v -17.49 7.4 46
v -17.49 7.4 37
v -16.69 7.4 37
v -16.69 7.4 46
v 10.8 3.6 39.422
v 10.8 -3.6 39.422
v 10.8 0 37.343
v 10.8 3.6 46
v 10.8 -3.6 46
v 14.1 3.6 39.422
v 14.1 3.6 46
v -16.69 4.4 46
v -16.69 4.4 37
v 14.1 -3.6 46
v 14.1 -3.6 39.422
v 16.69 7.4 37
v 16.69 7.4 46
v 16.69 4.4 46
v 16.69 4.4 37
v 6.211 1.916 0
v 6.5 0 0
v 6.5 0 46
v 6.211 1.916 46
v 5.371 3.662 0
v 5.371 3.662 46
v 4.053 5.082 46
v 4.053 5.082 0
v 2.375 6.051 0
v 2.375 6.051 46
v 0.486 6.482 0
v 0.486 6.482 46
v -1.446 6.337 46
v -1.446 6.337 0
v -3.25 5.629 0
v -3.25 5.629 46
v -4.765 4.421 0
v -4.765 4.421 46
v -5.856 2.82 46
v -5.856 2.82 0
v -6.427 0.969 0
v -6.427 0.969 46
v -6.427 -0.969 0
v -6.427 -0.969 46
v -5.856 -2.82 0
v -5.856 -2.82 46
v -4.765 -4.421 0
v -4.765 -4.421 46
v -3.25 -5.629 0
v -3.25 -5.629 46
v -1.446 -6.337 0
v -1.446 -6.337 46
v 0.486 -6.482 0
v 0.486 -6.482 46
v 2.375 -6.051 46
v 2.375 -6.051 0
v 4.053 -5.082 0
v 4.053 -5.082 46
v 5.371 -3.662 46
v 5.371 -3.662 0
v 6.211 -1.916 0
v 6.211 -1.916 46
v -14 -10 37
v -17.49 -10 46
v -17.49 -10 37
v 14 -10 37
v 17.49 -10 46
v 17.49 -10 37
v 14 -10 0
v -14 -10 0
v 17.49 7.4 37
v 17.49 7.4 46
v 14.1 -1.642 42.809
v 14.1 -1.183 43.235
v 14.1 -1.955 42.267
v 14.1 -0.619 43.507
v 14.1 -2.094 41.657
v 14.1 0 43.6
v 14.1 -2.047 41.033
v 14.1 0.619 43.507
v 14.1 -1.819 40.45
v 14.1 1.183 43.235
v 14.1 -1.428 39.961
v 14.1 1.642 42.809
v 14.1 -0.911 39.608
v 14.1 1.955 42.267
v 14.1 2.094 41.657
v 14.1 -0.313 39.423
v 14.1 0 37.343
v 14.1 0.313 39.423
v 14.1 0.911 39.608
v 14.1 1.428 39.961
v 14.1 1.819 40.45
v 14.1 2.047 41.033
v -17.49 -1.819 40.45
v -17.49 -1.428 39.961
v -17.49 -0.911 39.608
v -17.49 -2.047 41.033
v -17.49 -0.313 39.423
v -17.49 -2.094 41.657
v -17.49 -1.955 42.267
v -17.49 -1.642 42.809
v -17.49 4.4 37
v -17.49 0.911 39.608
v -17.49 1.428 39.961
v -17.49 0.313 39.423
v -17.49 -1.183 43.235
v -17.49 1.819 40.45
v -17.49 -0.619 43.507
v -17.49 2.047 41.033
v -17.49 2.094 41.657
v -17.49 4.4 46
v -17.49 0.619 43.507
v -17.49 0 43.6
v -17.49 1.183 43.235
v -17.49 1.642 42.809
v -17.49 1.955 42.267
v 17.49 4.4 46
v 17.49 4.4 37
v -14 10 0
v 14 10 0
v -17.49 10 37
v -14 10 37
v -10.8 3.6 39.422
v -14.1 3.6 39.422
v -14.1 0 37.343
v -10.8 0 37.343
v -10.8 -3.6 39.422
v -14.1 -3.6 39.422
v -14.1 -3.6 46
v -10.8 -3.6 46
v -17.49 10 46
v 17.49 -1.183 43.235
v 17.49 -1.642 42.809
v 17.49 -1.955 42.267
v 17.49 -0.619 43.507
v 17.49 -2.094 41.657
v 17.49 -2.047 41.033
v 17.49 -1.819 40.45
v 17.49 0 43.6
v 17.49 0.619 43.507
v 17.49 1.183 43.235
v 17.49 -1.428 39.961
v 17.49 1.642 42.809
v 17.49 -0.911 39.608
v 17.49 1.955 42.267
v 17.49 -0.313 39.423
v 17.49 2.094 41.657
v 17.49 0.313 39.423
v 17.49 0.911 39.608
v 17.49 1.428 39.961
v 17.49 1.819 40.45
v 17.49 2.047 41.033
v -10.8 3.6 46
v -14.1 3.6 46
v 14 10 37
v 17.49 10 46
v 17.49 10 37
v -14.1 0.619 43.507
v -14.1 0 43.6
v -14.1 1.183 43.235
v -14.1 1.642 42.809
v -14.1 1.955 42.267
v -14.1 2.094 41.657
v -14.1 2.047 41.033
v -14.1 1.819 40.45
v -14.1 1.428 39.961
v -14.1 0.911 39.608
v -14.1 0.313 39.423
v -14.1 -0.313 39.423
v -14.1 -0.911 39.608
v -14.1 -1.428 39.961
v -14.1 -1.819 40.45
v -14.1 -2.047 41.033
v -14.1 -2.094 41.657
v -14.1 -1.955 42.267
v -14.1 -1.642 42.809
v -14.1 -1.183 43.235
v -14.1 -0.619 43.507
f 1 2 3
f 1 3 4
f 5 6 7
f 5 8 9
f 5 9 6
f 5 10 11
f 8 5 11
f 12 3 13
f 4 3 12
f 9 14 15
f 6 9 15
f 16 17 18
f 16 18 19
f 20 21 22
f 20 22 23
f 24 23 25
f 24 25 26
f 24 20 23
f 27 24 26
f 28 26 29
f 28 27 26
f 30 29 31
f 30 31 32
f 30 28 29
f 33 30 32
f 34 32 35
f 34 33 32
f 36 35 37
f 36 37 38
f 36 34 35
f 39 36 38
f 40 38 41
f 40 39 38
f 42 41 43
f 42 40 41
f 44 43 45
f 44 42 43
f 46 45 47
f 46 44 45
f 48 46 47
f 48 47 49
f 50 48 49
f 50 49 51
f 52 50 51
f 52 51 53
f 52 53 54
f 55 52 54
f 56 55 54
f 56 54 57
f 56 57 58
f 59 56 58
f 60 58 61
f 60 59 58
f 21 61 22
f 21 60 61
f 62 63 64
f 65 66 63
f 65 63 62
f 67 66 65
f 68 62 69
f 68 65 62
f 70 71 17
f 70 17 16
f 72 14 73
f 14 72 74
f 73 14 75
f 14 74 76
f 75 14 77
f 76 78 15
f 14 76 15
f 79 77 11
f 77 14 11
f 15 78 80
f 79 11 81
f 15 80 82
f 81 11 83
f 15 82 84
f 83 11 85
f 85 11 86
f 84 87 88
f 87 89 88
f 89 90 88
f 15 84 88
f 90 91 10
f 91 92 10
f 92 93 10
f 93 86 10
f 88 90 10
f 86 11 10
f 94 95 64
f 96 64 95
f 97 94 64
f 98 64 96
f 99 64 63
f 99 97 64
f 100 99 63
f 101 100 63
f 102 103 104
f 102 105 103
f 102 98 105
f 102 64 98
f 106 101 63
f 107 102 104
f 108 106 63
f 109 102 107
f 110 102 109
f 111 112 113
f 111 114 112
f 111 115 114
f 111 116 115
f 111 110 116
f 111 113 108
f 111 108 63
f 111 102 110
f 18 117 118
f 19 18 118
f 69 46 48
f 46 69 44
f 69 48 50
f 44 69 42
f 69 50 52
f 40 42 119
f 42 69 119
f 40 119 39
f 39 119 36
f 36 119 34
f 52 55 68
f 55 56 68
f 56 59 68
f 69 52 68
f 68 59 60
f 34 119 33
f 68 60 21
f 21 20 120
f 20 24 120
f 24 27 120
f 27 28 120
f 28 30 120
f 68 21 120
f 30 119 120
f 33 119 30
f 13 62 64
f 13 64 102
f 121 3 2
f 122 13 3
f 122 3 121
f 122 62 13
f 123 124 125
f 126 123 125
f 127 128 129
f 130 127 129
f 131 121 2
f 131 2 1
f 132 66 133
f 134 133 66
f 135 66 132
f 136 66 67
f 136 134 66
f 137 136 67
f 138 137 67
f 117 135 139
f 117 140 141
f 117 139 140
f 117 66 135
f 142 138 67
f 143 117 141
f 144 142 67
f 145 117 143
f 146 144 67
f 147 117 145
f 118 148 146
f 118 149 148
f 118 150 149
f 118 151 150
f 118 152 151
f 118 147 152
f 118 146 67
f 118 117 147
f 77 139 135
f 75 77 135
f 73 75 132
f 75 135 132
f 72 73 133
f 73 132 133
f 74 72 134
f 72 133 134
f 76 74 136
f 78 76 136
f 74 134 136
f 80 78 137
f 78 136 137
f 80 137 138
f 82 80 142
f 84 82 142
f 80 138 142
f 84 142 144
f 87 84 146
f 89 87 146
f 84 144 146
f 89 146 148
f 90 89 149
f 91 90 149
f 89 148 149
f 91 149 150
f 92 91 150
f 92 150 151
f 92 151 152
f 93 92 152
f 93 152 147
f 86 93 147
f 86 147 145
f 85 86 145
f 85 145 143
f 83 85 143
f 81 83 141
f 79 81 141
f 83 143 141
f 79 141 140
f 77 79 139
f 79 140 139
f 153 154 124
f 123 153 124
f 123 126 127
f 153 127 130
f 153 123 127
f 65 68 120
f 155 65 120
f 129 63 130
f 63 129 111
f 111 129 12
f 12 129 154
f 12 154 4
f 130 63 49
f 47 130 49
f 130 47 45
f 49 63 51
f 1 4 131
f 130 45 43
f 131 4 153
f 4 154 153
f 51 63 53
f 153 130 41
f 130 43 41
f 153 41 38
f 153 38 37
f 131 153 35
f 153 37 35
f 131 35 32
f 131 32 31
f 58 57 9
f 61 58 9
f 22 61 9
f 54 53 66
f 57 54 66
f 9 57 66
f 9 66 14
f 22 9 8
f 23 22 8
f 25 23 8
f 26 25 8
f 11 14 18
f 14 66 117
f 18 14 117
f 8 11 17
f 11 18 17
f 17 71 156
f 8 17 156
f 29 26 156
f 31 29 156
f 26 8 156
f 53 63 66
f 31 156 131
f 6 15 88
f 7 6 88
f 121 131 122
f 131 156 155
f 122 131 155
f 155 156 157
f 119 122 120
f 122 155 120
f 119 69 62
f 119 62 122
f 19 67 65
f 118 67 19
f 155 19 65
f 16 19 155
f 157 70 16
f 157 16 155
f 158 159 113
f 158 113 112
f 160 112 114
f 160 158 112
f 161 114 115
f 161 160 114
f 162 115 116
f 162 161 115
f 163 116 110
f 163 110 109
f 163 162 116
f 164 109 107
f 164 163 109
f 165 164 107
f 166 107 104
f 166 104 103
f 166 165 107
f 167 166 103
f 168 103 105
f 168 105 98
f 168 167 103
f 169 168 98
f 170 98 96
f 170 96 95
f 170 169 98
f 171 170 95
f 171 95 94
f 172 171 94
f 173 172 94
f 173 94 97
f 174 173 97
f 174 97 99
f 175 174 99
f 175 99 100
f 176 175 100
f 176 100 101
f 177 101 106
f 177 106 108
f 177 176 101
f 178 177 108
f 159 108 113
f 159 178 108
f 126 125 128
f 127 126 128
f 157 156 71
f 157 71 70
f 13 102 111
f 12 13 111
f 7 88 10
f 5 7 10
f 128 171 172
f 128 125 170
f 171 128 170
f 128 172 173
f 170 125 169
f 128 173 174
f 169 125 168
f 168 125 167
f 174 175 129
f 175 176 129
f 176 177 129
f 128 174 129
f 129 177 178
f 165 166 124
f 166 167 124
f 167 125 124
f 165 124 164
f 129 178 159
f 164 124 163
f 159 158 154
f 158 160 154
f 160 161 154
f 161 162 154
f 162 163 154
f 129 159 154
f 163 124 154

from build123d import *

# Parameters (mm, degrees)
SZKIC1_W                    = 28
SZKIC1_H                    = 20
SZKIC1_R                    = 6.5
DODANIE_WYCI_GNI_CIE1_DEPTH = 46
SZKIC2_W                    = 0.1
SZKIC2_H                    = 9
DODANIE_WYCI_GNI_CIE2_DEPTH = 20
WYTNIJ_WYCI_GNI_CIE1_DEPTH  = 3.3
WYTNIJ_WYCI_GNI_CIE2_DEPTH  = 3.3
SZKIC5_W                    = 9
SZKIC5_H                    = 20
SZKIC5_R                    = 2.1
DODANIE_WYCI_GNI_CIE3_DEPTH = 3.39
DODANIE_WYCI_GNI_CIE4_START = 3.39
SZKIC6_W                    = 9
SZKIC6_H                    = 20
SZKIC6_R                    = 2.1
DODANIE_WYCI_GNI_CIE4_DEPTH = 3.39
SZKIC7_W                    = 9.448344777
SZKIC7_H                    = 3
WYTNIJ_WYCI_GNI_CIE3_DEPTH  = 0.8
SZKIC8_W                    = 9
SZKIC8_H                    = 3
WYTNIJ_WYCI_GNI_CIE4_DEPTH  = 0.8


with BuildPart() as part:
    # Szkic1 → Dodanie-wyciągnięcie1 (new body)
    with BuildSketch(Plane.XY):
        Rectangle(SZKIC1_W, SZKIC1_H)
        Circle(SZKIC1_R, mode=Mode.SUBTRACT)
    extrude(amount=DODANIE_WYCI_GNI_CIE1_DEPTH)

    # Szkic2 → Dodanie-wyciągnięcie2 (add)
    with BuildSketch(Plane(origin=(0, 10, 0), x_dir=(1, 0, 0), z_dir=(0, 1, 0))):
        with Locations((-14.05, -41.5)):
            Rectangle(SZKIC2_W, SZKIC2_H)
        with Locations((14.05, -41.5)):
            Rectangle(SZKIC2_W, SZKIC2_H)
    extrude(amount=-DODANIE_WYCI_GNI_CIE2_DEPTH)

    # Szkic3 → Wytnij-wyciągnięcie1 (cut)
    with BuildSketch(Plane(origin=(14.1, 0, 0), x_dir=(0, 0, -1), z_dir=(1, 0, 0))):
        Polygon((-39.421539031, -3.6), (-37.343078062, 0), (-39.421539031, 3.6), (-46, 3.6), (-46, -3.6), align=None)
    extrude(amount=-WYTNIJ_WYCI_GNI_CIE1_DEPTH, mode=Mode.SUBTRACT)

    # Szkic4 → Wytnij-wyciągnięcie2 (cut)
    with BuildSketch(Plane.ZY.offset(14.1)):
        Polygon((41.5, 3.6), (39.421539031, 3.6), (37.343078062, 0), (39.421539031, -3.6), (46, -3.6), (46, 3.6), align=None)
    extrude(amount=-WYTNIJ_WYCI_GNI_CIE2_DEPTH, mode=Mode.SUBTRACT)

    # Szkic5 → Dodanie-wyciągnięcie3 (add)
    with BuildSketch(Plane.ZY.offset(14.1)):
        with Locations((41.5, 0)):
            Rectangle(SZKIC5_W, SZKIC5_H)
        with Locations((41.5, 0)):
            Circle(SZKIC5_R, mode=Mode.SUBTRACT)
    extrude(amount=DODANIE_WYCI_GNI_CIE3_DEPTH)

    # Szkic6 → Dodanie-wyciągnięcie4 (add)
    with BuildSketch(Plane(origin=(14.1, 0, 0), x_dir=(0, 0, -1), z_dir=(1, 0, 0)).offset(DODANIE_WYCI_GNI_CIE4_START)):
        with Locations((-41.5, 0)):
            Rectangle(SZKIC6_W, SZKIC6_H)
        with Locations(Location((-41.5, 0, 0), (0, 0, 180))):
            Circle(SZKIC6_R, mode=Mode.SUBTRACT)
    extrude(amount=-DODANIE_WYCI_GNI_CIE4_DEPTH)

    # Szkic7 → Wytnij-wyciągnięcie3 (cut)
    with BuildSketch(Plane.ZY.offset(17.49)):
        with Locations((41.724172389, 5.9)):
            Rectangle(SZKIC7_W, SZKIC7_H)
    extrude(amount=-WYTNIJ_WYCI_GNI_CIE3_DEPTH, mode=Mode.SUBTRACT)

    # Szkic8 → Wytnij-wyciągnięcie4 (cut)
    with BuildSketch(Plane(origin=(17.49, 0, 0), x_dir=(0, 0, -1), z_dir=(1, 0, 0))):
        with Locations((-41.5, 5.9)):
            Rectangle(SZKIC8_W, SZKIC8_H)
    extrude(amount=-WYTNIJ_WYCI_GNI_CIE4_DEPTH, mode=Mode.SUBTRACT)


solid = part.part
